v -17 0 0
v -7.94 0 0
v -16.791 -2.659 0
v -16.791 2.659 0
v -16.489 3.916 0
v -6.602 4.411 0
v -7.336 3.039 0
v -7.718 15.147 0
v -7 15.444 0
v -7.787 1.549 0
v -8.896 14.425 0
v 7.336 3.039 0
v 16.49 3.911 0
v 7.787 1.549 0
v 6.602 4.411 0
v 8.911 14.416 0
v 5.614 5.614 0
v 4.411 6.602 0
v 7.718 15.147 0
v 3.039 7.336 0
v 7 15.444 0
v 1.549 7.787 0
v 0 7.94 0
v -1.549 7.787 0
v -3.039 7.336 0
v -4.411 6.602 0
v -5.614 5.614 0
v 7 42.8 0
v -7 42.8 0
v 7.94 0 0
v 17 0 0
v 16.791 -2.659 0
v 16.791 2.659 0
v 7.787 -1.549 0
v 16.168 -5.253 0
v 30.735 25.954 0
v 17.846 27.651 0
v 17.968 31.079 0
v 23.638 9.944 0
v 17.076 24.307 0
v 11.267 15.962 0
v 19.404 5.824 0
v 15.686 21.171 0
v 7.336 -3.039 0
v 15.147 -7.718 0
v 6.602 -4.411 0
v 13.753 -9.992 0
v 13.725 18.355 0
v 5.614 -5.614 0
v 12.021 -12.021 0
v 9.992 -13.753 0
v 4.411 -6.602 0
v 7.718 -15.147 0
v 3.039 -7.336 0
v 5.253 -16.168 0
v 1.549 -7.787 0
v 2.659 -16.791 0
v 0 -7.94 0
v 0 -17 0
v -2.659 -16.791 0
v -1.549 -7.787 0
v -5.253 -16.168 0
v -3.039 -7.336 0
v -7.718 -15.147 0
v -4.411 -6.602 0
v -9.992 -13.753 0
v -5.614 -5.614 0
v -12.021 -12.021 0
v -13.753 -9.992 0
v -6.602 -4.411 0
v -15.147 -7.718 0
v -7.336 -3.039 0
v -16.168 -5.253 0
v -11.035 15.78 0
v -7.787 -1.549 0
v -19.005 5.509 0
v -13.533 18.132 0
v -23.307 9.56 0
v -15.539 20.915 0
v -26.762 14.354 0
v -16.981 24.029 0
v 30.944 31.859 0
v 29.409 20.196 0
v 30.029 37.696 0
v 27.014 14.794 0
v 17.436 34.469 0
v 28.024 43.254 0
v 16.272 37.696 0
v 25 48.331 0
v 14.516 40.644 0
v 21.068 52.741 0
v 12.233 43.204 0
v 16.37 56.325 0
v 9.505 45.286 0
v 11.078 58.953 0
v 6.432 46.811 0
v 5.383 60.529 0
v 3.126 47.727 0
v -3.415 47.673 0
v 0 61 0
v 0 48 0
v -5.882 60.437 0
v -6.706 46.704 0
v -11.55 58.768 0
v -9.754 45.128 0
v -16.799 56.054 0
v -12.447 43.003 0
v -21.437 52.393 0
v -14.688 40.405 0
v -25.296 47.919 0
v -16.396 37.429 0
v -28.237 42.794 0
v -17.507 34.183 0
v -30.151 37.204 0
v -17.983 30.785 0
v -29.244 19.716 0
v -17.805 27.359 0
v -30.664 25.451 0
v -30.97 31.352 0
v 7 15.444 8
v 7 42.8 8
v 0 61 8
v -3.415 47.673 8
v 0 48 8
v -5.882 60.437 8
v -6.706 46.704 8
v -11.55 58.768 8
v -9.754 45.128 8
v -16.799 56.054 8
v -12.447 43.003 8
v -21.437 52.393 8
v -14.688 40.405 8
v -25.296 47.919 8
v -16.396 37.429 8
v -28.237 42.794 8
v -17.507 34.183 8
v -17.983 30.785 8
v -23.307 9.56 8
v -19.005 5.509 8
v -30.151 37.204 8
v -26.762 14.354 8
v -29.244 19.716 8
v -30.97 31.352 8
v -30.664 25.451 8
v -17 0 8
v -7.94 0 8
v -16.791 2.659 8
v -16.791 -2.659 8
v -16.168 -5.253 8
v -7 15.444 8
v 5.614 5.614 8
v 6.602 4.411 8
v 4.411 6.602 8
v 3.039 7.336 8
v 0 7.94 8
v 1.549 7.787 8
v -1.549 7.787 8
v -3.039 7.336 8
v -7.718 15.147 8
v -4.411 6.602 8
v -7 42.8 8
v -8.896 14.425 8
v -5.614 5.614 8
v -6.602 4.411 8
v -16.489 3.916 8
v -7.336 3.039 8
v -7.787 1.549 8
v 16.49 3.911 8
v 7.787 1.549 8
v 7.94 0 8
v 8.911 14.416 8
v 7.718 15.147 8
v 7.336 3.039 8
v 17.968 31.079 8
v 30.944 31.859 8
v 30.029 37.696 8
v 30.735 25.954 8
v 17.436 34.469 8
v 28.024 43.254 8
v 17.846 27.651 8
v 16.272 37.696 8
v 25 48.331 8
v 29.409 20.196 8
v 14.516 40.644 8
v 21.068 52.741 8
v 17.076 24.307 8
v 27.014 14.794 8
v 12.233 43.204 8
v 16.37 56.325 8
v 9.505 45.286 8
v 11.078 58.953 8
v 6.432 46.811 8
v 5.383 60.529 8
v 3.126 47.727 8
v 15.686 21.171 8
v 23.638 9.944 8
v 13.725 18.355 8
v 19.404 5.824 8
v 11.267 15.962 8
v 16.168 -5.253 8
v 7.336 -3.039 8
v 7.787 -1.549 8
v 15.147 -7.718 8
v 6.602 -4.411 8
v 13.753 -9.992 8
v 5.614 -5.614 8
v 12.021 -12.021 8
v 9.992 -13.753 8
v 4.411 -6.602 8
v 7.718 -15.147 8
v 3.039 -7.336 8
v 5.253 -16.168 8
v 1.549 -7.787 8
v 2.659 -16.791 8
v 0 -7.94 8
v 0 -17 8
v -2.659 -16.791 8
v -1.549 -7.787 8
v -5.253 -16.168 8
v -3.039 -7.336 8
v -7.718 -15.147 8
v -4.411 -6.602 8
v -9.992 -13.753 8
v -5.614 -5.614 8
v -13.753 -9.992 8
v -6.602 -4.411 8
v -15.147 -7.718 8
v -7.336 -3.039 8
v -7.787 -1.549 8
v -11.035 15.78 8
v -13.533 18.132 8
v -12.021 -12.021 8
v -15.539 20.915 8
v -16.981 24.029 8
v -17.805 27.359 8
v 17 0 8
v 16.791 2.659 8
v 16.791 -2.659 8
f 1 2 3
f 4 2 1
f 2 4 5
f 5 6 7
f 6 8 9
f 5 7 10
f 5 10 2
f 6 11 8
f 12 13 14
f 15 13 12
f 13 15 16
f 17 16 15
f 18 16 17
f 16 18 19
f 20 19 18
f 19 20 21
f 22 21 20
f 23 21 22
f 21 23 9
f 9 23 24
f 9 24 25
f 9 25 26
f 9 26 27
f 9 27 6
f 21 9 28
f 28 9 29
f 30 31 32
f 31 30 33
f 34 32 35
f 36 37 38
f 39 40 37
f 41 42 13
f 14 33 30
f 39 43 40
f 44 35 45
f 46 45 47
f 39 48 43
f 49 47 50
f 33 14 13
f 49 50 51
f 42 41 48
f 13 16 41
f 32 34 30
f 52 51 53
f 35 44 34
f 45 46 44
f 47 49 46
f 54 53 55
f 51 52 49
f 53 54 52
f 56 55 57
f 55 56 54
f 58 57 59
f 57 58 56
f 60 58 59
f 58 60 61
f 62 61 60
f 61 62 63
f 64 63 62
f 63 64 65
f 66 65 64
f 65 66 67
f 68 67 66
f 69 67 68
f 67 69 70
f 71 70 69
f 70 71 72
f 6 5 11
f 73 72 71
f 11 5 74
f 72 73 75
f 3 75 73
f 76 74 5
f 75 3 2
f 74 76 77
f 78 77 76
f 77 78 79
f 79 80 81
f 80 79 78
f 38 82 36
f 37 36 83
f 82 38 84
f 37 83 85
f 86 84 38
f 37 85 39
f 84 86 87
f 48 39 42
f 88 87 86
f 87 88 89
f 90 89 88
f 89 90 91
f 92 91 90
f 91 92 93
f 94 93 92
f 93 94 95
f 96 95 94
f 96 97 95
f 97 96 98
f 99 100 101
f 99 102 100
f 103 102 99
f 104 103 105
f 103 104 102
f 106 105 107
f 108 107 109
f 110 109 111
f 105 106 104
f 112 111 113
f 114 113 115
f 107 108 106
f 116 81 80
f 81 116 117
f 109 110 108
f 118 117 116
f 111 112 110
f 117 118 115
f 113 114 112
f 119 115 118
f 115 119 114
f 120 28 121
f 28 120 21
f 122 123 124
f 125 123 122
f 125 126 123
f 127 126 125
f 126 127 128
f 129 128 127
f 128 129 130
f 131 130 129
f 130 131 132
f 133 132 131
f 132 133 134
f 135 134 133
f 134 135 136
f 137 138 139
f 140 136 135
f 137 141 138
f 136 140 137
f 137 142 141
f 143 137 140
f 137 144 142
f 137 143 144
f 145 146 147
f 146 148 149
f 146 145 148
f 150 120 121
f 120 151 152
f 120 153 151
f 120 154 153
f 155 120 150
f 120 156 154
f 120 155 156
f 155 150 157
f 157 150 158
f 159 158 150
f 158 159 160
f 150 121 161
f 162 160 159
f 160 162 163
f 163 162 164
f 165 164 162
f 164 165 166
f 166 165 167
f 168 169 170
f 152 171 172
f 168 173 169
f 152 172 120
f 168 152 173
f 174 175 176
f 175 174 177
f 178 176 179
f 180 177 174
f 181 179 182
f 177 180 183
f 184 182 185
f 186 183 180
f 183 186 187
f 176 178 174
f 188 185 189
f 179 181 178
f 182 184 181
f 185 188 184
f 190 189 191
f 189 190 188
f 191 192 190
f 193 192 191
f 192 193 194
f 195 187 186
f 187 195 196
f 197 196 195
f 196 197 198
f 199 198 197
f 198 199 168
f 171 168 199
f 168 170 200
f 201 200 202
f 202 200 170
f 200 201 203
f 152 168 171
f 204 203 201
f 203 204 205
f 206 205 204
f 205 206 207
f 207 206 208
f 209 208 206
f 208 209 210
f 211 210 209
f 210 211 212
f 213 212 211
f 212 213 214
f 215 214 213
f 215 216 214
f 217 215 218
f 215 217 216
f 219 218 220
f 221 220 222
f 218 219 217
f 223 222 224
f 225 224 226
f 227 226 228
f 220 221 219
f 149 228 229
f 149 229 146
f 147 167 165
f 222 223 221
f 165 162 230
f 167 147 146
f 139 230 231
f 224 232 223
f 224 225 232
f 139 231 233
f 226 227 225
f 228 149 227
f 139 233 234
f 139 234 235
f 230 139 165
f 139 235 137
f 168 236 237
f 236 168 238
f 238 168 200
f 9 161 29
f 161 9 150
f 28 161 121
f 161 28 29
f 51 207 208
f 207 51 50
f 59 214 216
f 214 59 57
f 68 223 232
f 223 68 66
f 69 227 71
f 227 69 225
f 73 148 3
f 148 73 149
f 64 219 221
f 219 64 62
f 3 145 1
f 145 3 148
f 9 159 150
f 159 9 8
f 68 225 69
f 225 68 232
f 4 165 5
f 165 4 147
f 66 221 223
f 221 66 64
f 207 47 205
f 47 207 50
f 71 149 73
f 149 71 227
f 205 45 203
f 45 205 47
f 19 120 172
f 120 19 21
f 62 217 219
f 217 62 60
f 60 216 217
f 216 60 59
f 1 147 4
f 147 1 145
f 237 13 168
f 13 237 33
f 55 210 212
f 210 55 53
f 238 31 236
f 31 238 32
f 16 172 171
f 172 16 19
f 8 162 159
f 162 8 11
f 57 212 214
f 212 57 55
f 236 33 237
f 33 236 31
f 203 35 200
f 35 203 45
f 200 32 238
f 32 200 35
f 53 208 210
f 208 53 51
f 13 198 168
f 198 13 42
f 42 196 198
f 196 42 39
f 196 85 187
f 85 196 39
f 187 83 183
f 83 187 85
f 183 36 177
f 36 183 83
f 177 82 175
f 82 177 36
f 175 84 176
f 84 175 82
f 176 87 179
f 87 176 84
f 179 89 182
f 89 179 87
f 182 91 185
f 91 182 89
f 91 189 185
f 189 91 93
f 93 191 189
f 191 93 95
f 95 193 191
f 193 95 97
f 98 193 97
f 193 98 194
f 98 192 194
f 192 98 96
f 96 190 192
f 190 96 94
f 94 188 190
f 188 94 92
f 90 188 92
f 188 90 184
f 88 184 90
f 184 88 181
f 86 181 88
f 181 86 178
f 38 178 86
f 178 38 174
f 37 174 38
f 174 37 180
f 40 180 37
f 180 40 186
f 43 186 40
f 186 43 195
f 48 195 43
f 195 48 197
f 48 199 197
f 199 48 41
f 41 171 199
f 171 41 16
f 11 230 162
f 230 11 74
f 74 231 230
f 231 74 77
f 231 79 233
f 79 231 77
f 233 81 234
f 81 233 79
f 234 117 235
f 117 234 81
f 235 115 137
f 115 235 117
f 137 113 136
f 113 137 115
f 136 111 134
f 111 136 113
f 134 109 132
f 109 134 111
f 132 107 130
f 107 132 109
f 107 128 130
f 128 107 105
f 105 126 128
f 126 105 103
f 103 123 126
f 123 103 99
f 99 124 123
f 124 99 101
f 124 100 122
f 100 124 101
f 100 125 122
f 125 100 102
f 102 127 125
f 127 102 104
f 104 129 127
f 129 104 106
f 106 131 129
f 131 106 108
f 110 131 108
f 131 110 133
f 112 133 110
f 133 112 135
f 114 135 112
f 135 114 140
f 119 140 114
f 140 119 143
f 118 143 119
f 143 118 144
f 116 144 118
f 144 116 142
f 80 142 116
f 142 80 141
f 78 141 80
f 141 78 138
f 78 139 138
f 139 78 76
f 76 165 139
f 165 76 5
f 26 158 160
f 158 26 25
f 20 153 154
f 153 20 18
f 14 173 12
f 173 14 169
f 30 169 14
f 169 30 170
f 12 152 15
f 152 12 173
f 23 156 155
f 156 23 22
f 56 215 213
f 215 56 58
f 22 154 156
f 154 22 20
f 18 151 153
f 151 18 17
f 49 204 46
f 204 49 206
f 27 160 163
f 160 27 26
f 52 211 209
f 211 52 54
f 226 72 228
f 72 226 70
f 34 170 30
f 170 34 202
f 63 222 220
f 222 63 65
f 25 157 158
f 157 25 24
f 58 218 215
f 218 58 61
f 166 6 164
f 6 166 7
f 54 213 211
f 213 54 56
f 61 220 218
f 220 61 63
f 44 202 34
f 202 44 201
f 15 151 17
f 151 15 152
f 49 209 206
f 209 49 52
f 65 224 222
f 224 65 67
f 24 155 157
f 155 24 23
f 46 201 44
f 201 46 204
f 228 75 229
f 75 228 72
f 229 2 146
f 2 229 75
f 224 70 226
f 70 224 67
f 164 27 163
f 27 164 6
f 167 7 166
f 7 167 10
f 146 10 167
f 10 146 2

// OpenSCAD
$fn = 32;

// ----------------------------------------------------------------------
// Hook: 60 mm shank into a 18 mm curl, 8 mm thick
// ----------------------------------------------------------------------

// --- parameters (mm) ---
shank_len = 60;           // shank length from the boss centre
shank_w = 14;             // shank width
boss_d = 34;              // boss diameter
bore_d = 15.88;           // boss bore
curl_in = 18;             // curl inner radius
curl_out = 31;            // curl outer radius
curl_sweep = 350;         // curl sweep angle
hook_t = 8;               // hook thickness

shank_profile = [[-7, 42.8], [7, 42.8], [7, 15], [-7, 15]];
boss_profile = [[17, 0], [16.791, 2.659], [16.168, 5.253], [15.147, 7.718], [13.753, 9.992], [12.021, 12.021], [9.992, 13.753], [7.718, 15.147], [5.253, 16.168], [2.659, 16.791], [0, 17], [-2.659, 16.791], [-5.253, 16.168], [-7.718, 15.147], [-9.992, 13.753], [-12.021, 12.021], [-13.753, 9.992], [-15.147, 7.718], [-16.168, 5.253], [-16.791, 2.659], [-17, 0], [-16.791, -2.659], [-16.168, -5.253], [-15.147, -7.718], [-13.753, -9.992], [-12.021, -12.021], [-9.992, -13.753], [-7.718, -15.147], [-5.253, -16.168], [-2.659, -16.791], [0, -17], [2.659, -16.791], [5.253, -16.168], [7.718, -15.147], [9.992, -13.753], [12.021, -12.021], [13.753, -9.992], [15.147, -7.718], [16.168, -5.253], [16.791, -2.659]];
curl_profile = [[0, 61], [-5.882, 60.437], [-11.55, 58.768], [-16.799, 56.054], [-21.437, 52.393], [-25.296, 47.919], [-28.237, 42.794], [-30.151, 37.204], [-30.97, 31.352], [-30.664, 25.451], [-29.244, 19.716], [-26.762, 14.354], [-23.307, 9.56], [-19.005, 5.509], [-14.013, 2.348], [-8.512, 0.192], [-2.702, -0.882], [3.207, -0.834], [8.999, 0.335], [14.464, 2.581], [19.404, 5.824], [23.638, 9.944], [27.014, 14.794], [29.409, 20.196], [30.735, 25.954], [30.944, 31.859], [30.029, 37.696], [28.024, 43.254], [25, 48.331], [21.068, 52.741], [16.37, 56.325], [11.078, 58.953], [5.383, 60.529], [3.126, 47.727], [6.432, 46.811], [9.505, 45.286], [12.233, 43.204], [14.516, 40.644], [16.272, 37.696], [17.436, 34.469], [17.968, 31.079], [17.846, 27.651], [17.076, 24.307], [15.686, 21.171], [13.725, 18.355], [11.267, 15.962], [8.398, 14.079], [5.225, 12.775], [1.862, 12.097], [-1.569, 12.068], [-4.943, 12.692], [-8.137, 13.944], [-11.035, 15.78], [-13.533, 18.132], [-15.539, 20.915], [-16.981, 24.029], [-17.805, 27.359], [-17.983, 30.785], [-17.507, 34.183], [-16.396, 37.429], [-14.688, 40.405], [-12.447, 43.003], [-9.754, 45.128], [-6.706, 46.704], [-3.415, 47.673], [0, 48]];

difference() {
  union() {
    /* three overlapping outlines: shank, boss and the smooth curl */
    linear_extrude(height = hook_t) polygon(shank_profile);
    linear_extrude(height = hook_t) polygon(boss_profile);
    linear_extrude(height = hook_t) polygon(curl_profile);
  }
  translate([0, 0, -2.5]) cylinder(h = hook_t + 5, d = bore_d);
}
